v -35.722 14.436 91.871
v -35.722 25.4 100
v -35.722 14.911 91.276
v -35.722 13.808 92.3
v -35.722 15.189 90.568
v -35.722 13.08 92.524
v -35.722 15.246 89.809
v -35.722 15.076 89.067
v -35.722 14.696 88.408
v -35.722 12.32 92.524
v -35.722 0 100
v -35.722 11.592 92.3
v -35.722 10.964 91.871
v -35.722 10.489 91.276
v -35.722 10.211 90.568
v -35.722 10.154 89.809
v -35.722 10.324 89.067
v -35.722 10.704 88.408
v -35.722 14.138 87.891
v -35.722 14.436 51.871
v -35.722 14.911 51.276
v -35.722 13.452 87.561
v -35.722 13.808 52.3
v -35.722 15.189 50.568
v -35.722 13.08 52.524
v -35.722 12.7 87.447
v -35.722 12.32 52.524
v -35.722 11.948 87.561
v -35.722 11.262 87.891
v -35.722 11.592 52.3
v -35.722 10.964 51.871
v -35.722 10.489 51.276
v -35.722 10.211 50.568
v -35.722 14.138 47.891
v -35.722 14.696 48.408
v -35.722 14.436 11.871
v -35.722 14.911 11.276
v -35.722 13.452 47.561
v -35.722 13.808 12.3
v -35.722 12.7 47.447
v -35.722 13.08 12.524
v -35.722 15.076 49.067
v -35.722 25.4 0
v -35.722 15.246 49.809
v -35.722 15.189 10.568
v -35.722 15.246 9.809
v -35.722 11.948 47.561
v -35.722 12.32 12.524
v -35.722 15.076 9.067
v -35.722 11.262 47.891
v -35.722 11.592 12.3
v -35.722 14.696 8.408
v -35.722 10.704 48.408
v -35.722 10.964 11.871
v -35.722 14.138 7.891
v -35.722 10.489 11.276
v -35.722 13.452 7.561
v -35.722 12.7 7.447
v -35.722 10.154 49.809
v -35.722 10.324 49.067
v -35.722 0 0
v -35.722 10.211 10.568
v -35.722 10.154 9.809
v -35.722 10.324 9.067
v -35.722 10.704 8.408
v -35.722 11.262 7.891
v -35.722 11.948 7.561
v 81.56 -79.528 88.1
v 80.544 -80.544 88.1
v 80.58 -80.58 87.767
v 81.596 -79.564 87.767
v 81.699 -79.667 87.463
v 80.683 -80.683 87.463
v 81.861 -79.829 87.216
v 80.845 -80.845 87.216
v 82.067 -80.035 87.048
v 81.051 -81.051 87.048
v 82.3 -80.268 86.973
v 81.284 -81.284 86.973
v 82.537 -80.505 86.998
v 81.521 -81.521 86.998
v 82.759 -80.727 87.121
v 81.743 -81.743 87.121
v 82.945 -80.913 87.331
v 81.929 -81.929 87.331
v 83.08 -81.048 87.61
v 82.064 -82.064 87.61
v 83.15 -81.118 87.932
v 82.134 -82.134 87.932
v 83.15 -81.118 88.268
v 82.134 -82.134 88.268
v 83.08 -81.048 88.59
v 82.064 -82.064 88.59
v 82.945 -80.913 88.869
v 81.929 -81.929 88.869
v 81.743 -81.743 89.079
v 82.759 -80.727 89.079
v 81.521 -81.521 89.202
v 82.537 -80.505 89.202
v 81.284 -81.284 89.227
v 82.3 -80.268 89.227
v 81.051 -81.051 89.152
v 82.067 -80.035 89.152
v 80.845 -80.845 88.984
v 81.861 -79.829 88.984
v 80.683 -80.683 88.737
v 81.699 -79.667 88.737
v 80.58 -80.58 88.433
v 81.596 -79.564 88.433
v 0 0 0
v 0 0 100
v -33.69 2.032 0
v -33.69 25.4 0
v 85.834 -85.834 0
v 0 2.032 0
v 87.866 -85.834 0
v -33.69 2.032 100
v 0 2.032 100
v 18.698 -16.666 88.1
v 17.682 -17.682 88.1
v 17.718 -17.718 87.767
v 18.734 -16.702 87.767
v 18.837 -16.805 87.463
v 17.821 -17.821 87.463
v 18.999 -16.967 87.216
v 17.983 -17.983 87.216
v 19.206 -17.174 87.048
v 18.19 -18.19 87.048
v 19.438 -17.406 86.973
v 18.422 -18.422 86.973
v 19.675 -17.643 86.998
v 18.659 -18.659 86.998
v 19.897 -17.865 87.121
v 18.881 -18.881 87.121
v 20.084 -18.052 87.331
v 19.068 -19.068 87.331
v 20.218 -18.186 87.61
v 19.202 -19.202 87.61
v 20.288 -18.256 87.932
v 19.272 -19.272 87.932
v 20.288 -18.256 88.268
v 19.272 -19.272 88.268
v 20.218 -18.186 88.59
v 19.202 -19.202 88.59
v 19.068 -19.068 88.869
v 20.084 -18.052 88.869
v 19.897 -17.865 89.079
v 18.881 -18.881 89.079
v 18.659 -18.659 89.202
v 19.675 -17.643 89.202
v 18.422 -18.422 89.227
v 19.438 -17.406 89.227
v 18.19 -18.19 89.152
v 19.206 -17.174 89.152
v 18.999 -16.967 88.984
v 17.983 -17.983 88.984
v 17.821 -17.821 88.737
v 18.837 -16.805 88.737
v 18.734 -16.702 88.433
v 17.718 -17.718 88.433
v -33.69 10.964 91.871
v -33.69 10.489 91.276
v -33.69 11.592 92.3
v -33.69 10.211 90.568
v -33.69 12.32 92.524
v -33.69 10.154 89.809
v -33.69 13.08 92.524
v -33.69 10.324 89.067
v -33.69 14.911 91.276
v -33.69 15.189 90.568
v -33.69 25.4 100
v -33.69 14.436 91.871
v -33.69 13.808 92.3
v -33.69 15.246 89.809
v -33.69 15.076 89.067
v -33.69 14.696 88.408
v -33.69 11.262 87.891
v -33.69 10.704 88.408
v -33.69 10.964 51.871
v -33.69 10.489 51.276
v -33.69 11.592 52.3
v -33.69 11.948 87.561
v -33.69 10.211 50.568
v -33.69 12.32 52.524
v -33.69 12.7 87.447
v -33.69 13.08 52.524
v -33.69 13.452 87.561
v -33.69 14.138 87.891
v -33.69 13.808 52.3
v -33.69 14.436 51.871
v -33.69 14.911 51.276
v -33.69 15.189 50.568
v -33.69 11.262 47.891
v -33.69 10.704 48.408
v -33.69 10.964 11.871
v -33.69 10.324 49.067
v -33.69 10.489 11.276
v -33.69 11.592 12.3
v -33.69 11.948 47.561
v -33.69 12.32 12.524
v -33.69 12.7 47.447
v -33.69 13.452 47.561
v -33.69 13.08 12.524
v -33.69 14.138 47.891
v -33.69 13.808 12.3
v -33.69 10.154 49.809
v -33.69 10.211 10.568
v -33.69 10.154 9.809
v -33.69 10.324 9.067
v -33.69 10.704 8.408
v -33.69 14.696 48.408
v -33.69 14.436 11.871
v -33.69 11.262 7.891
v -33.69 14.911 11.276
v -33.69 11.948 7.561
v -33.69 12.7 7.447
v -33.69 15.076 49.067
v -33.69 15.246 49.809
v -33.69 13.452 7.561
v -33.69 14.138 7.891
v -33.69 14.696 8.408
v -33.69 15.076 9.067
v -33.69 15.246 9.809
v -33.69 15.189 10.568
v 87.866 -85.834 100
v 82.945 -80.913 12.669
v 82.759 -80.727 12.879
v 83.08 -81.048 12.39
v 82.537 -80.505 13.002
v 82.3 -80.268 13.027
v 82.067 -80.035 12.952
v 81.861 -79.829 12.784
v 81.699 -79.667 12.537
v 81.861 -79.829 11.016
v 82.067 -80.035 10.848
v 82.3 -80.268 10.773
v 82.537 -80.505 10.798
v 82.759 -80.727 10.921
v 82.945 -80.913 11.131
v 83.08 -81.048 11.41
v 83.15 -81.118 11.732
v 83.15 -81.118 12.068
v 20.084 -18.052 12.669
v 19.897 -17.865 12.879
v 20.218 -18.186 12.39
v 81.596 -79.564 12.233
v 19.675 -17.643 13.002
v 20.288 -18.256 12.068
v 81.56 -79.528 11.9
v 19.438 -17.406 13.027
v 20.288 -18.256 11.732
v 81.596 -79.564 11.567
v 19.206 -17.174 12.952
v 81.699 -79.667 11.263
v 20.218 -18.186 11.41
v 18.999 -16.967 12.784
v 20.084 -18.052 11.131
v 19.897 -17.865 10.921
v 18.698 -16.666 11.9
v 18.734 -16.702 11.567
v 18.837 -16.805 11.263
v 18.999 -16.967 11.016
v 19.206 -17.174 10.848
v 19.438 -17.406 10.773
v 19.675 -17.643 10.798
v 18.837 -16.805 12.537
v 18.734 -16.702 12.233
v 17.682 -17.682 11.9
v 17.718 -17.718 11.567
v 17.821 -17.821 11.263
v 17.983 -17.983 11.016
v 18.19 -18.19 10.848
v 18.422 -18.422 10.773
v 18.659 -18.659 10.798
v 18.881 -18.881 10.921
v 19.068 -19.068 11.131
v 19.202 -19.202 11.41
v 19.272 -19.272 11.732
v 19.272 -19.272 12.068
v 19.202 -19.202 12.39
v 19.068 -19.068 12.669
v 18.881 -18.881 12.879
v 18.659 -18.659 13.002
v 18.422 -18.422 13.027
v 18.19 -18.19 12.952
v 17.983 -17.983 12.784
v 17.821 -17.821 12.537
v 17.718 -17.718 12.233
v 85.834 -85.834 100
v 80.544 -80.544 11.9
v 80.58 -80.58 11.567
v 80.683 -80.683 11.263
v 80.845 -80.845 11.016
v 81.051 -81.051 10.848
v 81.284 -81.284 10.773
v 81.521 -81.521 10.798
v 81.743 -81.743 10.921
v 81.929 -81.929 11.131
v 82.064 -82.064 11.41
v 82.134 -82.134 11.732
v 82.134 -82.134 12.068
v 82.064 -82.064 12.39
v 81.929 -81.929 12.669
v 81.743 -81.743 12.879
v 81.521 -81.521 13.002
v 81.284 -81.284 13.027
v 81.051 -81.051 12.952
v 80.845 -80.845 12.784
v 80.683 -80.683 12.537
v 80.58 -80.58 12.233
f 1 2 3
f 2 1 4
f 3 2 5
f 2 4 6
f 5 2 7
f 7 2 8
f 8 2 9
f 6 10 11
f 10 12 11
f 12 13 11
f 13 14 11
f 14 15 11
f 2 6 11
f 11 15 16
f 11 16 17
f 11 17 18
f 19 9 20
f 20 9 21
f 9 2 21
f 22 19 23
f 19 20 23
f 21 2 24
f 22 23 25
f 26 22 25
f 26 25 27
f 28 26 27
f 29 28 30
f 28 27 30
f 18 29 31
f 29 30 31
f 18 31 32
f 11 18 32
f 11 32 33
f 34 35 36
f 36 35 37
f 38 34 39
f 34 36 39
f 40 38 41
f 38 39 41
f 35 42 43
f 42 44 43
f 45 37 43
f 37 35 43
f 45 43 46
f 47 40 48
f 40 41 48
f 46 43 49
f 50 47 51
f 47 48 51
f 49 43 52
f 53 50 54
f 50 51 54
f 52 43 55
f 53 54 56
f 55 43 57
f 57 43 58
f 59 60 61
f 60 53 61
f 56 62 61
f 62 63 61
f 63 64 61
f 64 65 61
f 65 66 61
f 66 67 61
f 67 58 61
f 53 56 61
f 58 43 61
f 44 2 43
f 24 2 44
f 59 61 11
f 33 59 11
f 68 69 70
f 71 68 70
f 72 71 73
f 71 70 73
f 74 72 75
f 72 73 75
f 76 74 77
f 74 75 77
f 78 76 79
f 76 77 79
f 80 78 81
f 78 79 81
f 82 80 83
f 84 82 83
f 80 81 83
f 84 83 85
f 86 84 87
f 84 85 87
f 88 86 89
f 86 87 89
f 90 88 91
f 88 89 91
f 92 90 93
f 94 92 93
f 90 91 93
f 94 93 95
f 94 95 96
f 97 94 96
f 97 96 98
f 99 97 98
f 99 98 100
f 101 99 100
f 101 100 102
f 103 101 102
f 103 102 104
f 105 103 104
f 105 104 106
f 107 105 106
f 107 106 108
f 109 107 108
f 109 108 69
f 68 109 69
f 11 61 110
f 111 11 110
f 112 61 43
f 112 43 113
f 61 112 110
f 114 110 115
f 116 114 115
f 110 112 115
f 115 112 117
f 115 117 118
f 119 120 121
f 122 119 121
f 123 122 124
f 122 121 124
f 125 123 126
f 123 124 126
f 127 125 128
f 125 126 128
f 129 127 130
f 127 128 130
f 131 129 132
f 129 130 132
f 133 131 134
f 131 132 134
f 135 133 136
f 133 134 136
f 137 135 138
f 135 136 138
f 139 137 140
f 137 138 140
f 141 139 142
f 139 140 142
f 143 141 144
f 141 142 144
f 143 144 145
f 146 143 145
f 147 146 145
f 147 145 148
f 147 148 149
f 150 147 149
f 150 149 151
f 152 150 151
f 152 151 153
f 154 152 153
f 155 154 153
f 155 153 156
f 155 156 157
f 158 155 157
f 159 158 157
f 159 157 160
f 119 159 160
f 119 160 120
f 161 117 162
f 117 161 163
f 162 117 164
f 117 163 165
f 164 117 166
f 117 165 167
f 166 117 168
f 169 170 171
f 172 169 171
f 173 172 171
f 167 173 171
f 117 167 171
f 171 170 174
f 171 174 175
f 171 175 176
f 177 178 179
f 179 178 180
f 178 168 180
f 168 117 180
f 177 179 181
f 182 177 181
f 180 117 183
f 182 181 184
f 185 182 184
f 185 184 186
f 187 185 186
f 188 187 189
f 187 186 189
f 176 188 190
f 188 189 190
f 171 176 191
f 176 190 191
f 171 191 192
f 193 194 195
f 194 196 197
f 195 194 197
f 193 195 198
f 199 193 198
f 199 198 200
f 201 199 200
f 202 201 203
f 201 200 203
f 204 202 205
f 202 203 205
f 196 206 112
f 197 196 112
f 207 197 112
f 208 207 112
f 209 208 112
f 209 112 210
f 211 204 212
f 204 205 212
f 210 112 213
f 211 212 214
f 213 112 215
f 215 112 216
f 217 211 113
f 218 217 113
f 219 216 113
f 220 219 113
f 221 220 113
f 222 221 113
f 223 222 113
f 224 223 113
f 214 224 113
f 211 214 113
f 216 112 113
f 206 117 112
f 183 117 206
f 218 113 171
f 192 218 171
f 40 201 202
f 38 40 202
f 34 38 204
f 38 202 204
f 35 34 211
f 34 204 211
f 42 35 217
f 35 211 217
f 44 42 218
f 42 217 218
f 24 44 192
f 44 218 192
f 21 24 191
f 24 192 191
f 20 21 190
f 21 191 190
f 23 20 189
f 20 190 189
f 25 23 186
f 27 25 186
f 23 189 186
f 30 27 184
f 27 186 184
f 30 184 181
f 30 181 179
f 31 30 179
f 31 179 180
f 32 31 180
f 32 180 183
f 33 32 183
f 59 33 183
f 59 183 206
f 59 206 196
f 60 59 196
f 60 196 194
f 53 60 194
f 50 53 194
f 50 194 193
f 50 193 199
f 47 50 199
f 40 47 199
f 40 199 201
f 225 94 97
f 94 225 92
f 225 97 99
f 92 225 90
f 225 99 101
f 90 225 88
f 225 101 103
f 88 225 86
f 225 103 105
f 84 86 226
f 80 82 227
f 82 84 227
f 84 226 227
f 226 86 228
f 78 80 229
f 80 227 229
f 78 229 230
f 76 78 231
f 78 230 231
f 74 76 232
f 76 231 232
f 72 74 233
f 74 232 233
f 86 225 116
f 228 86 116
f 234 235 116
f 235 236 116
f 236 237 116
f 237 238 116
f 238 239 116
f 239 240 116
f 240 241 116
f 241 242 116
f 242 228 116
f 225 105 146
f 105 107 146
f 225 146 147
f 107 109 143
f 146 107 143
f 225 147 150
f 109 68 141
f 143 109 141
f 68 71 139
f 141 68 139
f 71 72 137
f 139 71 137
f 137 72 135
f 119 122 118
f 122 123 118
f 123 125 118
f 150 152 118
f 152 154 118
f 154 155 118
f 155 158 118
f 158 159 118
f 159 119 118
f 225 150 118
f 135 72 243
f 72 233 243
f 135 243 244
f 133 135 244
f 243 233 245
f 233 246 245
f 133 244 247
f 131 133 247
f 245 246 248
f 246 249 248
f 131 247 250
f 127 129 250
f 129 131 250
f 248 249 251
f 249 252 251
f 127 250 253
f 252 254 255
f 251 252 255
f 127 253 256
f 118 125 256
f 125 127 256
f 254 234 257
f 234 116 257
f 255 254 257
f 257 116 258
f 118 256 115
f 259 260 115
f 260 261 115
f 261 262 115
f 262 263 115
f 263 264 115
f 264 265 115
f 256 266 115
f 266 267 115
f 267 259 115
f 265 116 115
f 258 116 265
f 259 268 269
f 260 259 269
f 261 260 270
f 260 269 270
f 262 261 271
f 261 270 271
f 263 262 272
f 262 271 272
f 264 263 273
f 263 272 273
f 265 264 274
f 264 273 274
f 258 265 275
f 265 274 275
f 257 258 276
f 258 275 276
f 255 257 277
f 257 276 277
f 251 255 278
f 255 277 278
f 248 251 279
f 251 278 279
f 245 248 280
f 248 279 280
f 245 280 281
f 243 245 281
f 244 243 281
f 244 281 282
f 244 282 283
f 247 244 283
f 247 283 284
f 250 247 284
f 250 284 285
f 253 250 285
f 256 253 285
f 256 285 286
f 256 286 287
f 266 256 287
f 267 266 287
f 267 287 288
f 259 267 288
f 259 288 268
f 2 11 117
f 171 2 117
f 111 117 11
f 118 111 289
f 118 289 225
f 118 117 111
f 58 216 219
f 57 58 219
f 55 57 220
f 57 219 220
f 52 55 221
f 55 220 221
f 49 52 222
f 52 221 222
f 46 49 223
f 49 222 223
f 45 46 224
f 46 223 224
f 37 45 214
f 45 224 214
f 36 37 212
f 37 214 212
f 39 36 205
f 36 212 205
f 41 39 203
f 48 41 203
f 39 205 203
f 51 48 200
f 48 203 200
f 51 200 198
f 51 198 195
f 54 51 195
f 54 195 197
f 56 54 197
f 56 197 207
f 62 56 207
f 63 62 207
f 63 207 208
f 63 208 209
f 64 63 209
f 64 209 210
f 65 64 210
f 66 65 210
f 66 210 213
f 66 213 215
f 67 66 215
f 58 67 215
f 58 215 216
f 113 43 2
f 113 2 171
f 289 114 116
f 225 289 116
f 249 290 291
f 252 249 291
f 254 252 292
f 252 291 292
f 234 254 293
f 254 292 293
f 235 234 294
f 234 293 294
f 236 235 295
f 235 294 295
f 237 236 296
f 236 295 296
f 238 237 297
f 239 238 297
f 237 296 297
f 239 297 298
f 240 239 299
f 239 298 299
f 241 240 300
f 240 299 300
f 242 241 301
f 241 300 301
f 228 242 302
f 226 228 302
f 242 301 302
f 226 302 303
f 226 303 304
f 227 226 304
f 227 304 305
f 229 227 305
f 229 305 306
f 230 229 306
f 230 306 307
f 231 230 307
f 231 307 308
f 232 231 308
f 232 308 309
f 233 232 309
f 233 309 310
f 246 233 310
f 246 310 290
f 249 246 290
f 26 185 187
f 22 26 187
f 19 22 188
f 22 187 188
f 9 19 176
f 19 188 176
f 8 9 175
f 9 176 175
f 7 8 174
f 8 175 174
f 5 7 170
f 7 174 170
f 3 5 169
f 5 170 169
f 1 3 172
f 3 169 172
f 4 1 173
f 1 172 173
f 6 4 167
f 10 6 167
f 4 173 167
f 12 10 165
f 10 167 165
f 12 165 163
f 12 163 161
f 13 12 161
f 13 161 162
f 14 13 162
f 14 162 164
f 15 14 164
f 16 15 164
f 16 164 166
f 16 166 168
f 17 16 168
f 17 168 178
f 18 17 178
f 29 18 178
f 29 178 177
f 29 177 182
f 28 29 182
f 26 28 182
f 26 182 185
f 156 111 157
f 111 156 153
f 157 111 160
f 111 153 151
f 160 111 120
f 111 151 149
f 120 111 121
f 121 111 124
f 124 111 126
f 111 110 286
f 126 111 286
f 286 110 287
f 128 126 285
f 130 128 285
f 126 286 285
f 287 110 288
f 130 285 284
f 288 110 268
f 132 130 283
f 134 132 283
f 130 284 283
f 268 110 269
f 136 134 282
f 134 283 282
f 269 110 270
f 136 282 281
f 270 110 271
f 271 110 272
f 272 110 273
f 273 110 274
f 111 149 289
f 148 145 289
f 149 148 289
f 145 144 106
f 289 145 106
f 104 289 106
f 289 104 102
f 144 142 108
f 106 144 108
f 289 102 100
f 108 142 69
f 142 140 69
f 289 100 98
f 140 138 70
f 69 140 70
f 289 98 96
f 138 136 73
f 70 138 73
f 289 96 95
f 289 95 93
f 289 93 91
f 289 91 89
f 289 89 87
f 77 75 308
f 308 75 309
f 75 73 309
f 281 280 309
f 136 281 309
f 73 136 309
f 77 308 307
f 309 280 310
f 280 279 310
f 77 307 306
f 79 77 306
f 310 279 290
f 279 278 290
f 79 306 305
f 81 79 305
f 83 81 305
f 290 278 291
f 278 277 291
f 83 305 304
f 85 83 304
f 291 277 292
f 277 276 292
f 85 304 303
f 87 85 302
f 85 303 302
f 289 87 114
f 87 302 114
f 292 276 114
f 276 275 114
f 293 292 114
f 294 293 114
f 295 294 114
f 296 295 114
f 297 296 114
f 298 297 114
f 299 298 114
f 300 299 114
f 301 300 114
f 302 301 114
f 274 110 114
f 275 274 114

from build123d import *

# Parameters (mm, degrees)
BOSS_EXTRUDE1_DEPTH     = 100
CUT_EXTRUDE1_DEPTH      = 159.384645446
CUT_EXTRUDE1_DEPTH_BACK = 159.384645446
SKETCH2_R               = 1.13
F_4_40_TAPPED_HOLE1_D   = 2.2606
F_1_4_20_TAPPED_HOLE1_D = 5.1054


with BuildPart() as part:
    # Sketch1 → Boss-Extrude1 (new body)
    with BuildSketch(Plane.XY):
        Polygon((87.865570848, -85.833570848), (0, 2.032), (-33.68957, 2.032), (-33.68957, 25.4), (-35.72157, 25.4), (-35.72157, 0), (0, 0), (85.833570848, -85.833570848), align=None)
    extrude(amount=BOSS_EXTRUDE1_DEPTH)

    # Sketch2 → Cut-Extrude1 (cut, two sides: drawn at the far end of the back side and taken through both)
    with BuildSketch(Plane(origin=(1.016, 1.016, 0), x_dir=(0, 0, -1), z_dir=(0.707106781186546, 0.707106781186549, 0)).offset(-CUT_EXTRUDE1_DEPTH_BACK)):
        with Locations((-88.1, -26.137000979)):
            Circle(SKETCH2_R)
        with Locations((-11.9, -26.137000979)):
            Circle(SKETCH2_R)
        with Locations((-11.9, -115.037000979)):
            Circle(SKETCH2_R)
        with Locations((-88.1, -115.037000979)):
            Circle(SKETCH2_R)
    extrude(amount=CUT_EXTRUDE1_DEPTH + CUT_EXTRUDE1_DEPTH_BACK, mode=Mode.SUBTRACT)

    # #4-40 Tapped Hole1 (through all)
    with Locations(Plane(origin=(19.497650632, -17.465650632, 88.1), x_dir=(0.707106781187, -0.707106781187, 0), z_dir=(0.707106781187, 0.707106781187, 0))):
        with Locations((1e-09, 0), (1e-09, 76.2), (88.900000001, 76.2), (88.900000001, 0)):
            Hole(F_4_40_TAPPED_HOLE1_D / 2)

    # 1/4-20 Tapped Hole1 (through all)
    with Locations(Plane.ZY.offset(35.72157)):
        with Locations((10, 12.7), (50, 12.7), (90, 12.7)):
            Hole(F_1_4_20_TAPPED_HOLE1_D / 2)


solid = part.part
